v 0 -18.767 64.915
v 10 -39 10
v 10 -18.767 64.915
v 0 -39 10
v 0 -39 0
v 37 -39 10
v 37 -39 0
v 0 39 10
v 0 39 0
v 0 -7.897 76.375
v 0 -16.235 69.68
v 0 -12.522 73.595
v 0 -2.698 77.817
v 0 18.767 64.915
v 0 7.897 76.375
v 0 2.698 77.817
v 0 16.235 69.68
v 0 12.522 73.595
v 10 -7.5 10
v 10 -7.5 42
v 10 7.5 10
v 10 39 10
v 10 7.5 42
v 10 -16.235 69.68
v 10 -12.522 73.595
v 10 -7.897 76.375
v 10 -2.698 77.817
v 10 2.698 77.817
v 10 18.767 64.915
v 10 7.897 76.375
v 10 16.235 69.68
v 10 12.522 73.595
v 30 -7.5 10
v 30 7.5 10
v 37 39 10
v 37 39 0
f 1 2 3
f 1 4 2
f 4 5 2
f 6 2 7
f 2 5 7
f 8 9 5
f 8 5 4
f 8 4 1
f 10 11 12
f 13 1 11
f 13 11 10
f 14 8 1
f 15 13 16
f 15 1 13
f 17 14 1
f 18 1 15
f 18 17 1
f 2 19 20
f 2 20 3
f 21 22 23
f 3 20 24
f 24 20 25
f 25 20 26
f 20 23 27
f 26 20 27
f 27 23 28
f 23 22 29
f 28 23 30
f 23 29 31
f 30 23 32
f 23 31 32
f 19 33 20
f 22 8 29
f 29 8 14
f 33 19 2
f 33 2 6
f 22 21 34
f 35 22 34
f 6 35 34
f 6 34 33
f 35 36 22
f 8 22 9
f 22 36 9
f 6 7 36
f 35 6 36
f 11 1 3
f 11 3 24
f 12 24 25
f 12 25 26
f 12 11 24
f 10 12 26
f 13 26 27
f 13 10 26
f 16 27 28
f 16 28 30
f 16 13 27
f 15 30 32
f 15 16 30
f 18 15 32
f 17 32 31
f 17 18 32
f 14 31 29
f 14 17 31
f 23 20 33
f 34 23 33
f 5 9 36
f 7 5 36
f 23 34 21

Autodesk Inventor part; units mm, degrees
ref_plane "YZ Plane" through (0, 0, 0) normal (1, 0, 0) x (0, 1, 0)
ref_plane "XZ Plane" through (0, 0, 0) normal (0, 1, 0) x (-1, 0, 0)
ref_plane "XY Plane" through (0, 0, 0) normal (0, 0, 1) x (1, 0, 0)
sketch "Sketch1" plane through (0, 0, 0) normal (0, 0, 1) x (1, 0, 0)
  line L0 (0, 54.6) -> (0, -54.6) projected
  line L1 (-7.4, 0) -> (44.4, 0) projected
  line L2 (0, -39) -> (37, -39)
  line L3 (37, -39) -> (37, 39)
  line L4 (37, 39) -> (0, 39)
  line L5 (0, 39) -> (0, -39)
  dimension "d0" = 78
  dimension "d1" = 37
extrude "Extrusion1" add sketch "Sketch1" along normal blind 10
sketch "Sketch2" plane through (0, -39, 0) normal (-1, 0, 0) x (0, 0, 1)
  line L0 (10, 0) -> (10, 78) projected
  line L1 (0, 0) -> (10, 0) projected
  arc A0 (64.9146, 20.2333) -> (64.9146, 57.7667) centre (58, 39) ccw
  line L2 (10, 78) -> (64.9146, 57.7667)
  line L3 (10, 0) -> (64.9146, 20.2333)
  line L4 (10, 39) -> (96.3921, 39) construction
  dimension "d4" = 20
  dimension "d5" = 48
extrude "Extrusion2" add sketch "Sketch2" against normal blind 10
sketch "Sketch4" plane through (0, 0, 0) normal (0, 1, 0) x (-1, 0, 0)
  line L0 (-37, 10) -> (-10, 10)
  line L1 (-10, 10) -> (0, 10)
  line L2 (0, 0) -> (0, 10)
  line L3 (0, 0) -> (-37, 0)
  line L4 (-37, 0) -> (-37, 10)
  line L5 (-10, 10) -> (-10, 64.9146)
  line L6 (-10, 42) -> (-30, 10)
  line L7 (-10, 42) -> (-10, 10)
  line L8 (-10, 10) -> (-30, 10)
  dimension "d12" = 32
  dimension "d13" = 20
extrude "Extrusion3" add sketch "Sketch4" along normal mid plane 15 contours L6 L5 L0
properties part number "Bracket"
